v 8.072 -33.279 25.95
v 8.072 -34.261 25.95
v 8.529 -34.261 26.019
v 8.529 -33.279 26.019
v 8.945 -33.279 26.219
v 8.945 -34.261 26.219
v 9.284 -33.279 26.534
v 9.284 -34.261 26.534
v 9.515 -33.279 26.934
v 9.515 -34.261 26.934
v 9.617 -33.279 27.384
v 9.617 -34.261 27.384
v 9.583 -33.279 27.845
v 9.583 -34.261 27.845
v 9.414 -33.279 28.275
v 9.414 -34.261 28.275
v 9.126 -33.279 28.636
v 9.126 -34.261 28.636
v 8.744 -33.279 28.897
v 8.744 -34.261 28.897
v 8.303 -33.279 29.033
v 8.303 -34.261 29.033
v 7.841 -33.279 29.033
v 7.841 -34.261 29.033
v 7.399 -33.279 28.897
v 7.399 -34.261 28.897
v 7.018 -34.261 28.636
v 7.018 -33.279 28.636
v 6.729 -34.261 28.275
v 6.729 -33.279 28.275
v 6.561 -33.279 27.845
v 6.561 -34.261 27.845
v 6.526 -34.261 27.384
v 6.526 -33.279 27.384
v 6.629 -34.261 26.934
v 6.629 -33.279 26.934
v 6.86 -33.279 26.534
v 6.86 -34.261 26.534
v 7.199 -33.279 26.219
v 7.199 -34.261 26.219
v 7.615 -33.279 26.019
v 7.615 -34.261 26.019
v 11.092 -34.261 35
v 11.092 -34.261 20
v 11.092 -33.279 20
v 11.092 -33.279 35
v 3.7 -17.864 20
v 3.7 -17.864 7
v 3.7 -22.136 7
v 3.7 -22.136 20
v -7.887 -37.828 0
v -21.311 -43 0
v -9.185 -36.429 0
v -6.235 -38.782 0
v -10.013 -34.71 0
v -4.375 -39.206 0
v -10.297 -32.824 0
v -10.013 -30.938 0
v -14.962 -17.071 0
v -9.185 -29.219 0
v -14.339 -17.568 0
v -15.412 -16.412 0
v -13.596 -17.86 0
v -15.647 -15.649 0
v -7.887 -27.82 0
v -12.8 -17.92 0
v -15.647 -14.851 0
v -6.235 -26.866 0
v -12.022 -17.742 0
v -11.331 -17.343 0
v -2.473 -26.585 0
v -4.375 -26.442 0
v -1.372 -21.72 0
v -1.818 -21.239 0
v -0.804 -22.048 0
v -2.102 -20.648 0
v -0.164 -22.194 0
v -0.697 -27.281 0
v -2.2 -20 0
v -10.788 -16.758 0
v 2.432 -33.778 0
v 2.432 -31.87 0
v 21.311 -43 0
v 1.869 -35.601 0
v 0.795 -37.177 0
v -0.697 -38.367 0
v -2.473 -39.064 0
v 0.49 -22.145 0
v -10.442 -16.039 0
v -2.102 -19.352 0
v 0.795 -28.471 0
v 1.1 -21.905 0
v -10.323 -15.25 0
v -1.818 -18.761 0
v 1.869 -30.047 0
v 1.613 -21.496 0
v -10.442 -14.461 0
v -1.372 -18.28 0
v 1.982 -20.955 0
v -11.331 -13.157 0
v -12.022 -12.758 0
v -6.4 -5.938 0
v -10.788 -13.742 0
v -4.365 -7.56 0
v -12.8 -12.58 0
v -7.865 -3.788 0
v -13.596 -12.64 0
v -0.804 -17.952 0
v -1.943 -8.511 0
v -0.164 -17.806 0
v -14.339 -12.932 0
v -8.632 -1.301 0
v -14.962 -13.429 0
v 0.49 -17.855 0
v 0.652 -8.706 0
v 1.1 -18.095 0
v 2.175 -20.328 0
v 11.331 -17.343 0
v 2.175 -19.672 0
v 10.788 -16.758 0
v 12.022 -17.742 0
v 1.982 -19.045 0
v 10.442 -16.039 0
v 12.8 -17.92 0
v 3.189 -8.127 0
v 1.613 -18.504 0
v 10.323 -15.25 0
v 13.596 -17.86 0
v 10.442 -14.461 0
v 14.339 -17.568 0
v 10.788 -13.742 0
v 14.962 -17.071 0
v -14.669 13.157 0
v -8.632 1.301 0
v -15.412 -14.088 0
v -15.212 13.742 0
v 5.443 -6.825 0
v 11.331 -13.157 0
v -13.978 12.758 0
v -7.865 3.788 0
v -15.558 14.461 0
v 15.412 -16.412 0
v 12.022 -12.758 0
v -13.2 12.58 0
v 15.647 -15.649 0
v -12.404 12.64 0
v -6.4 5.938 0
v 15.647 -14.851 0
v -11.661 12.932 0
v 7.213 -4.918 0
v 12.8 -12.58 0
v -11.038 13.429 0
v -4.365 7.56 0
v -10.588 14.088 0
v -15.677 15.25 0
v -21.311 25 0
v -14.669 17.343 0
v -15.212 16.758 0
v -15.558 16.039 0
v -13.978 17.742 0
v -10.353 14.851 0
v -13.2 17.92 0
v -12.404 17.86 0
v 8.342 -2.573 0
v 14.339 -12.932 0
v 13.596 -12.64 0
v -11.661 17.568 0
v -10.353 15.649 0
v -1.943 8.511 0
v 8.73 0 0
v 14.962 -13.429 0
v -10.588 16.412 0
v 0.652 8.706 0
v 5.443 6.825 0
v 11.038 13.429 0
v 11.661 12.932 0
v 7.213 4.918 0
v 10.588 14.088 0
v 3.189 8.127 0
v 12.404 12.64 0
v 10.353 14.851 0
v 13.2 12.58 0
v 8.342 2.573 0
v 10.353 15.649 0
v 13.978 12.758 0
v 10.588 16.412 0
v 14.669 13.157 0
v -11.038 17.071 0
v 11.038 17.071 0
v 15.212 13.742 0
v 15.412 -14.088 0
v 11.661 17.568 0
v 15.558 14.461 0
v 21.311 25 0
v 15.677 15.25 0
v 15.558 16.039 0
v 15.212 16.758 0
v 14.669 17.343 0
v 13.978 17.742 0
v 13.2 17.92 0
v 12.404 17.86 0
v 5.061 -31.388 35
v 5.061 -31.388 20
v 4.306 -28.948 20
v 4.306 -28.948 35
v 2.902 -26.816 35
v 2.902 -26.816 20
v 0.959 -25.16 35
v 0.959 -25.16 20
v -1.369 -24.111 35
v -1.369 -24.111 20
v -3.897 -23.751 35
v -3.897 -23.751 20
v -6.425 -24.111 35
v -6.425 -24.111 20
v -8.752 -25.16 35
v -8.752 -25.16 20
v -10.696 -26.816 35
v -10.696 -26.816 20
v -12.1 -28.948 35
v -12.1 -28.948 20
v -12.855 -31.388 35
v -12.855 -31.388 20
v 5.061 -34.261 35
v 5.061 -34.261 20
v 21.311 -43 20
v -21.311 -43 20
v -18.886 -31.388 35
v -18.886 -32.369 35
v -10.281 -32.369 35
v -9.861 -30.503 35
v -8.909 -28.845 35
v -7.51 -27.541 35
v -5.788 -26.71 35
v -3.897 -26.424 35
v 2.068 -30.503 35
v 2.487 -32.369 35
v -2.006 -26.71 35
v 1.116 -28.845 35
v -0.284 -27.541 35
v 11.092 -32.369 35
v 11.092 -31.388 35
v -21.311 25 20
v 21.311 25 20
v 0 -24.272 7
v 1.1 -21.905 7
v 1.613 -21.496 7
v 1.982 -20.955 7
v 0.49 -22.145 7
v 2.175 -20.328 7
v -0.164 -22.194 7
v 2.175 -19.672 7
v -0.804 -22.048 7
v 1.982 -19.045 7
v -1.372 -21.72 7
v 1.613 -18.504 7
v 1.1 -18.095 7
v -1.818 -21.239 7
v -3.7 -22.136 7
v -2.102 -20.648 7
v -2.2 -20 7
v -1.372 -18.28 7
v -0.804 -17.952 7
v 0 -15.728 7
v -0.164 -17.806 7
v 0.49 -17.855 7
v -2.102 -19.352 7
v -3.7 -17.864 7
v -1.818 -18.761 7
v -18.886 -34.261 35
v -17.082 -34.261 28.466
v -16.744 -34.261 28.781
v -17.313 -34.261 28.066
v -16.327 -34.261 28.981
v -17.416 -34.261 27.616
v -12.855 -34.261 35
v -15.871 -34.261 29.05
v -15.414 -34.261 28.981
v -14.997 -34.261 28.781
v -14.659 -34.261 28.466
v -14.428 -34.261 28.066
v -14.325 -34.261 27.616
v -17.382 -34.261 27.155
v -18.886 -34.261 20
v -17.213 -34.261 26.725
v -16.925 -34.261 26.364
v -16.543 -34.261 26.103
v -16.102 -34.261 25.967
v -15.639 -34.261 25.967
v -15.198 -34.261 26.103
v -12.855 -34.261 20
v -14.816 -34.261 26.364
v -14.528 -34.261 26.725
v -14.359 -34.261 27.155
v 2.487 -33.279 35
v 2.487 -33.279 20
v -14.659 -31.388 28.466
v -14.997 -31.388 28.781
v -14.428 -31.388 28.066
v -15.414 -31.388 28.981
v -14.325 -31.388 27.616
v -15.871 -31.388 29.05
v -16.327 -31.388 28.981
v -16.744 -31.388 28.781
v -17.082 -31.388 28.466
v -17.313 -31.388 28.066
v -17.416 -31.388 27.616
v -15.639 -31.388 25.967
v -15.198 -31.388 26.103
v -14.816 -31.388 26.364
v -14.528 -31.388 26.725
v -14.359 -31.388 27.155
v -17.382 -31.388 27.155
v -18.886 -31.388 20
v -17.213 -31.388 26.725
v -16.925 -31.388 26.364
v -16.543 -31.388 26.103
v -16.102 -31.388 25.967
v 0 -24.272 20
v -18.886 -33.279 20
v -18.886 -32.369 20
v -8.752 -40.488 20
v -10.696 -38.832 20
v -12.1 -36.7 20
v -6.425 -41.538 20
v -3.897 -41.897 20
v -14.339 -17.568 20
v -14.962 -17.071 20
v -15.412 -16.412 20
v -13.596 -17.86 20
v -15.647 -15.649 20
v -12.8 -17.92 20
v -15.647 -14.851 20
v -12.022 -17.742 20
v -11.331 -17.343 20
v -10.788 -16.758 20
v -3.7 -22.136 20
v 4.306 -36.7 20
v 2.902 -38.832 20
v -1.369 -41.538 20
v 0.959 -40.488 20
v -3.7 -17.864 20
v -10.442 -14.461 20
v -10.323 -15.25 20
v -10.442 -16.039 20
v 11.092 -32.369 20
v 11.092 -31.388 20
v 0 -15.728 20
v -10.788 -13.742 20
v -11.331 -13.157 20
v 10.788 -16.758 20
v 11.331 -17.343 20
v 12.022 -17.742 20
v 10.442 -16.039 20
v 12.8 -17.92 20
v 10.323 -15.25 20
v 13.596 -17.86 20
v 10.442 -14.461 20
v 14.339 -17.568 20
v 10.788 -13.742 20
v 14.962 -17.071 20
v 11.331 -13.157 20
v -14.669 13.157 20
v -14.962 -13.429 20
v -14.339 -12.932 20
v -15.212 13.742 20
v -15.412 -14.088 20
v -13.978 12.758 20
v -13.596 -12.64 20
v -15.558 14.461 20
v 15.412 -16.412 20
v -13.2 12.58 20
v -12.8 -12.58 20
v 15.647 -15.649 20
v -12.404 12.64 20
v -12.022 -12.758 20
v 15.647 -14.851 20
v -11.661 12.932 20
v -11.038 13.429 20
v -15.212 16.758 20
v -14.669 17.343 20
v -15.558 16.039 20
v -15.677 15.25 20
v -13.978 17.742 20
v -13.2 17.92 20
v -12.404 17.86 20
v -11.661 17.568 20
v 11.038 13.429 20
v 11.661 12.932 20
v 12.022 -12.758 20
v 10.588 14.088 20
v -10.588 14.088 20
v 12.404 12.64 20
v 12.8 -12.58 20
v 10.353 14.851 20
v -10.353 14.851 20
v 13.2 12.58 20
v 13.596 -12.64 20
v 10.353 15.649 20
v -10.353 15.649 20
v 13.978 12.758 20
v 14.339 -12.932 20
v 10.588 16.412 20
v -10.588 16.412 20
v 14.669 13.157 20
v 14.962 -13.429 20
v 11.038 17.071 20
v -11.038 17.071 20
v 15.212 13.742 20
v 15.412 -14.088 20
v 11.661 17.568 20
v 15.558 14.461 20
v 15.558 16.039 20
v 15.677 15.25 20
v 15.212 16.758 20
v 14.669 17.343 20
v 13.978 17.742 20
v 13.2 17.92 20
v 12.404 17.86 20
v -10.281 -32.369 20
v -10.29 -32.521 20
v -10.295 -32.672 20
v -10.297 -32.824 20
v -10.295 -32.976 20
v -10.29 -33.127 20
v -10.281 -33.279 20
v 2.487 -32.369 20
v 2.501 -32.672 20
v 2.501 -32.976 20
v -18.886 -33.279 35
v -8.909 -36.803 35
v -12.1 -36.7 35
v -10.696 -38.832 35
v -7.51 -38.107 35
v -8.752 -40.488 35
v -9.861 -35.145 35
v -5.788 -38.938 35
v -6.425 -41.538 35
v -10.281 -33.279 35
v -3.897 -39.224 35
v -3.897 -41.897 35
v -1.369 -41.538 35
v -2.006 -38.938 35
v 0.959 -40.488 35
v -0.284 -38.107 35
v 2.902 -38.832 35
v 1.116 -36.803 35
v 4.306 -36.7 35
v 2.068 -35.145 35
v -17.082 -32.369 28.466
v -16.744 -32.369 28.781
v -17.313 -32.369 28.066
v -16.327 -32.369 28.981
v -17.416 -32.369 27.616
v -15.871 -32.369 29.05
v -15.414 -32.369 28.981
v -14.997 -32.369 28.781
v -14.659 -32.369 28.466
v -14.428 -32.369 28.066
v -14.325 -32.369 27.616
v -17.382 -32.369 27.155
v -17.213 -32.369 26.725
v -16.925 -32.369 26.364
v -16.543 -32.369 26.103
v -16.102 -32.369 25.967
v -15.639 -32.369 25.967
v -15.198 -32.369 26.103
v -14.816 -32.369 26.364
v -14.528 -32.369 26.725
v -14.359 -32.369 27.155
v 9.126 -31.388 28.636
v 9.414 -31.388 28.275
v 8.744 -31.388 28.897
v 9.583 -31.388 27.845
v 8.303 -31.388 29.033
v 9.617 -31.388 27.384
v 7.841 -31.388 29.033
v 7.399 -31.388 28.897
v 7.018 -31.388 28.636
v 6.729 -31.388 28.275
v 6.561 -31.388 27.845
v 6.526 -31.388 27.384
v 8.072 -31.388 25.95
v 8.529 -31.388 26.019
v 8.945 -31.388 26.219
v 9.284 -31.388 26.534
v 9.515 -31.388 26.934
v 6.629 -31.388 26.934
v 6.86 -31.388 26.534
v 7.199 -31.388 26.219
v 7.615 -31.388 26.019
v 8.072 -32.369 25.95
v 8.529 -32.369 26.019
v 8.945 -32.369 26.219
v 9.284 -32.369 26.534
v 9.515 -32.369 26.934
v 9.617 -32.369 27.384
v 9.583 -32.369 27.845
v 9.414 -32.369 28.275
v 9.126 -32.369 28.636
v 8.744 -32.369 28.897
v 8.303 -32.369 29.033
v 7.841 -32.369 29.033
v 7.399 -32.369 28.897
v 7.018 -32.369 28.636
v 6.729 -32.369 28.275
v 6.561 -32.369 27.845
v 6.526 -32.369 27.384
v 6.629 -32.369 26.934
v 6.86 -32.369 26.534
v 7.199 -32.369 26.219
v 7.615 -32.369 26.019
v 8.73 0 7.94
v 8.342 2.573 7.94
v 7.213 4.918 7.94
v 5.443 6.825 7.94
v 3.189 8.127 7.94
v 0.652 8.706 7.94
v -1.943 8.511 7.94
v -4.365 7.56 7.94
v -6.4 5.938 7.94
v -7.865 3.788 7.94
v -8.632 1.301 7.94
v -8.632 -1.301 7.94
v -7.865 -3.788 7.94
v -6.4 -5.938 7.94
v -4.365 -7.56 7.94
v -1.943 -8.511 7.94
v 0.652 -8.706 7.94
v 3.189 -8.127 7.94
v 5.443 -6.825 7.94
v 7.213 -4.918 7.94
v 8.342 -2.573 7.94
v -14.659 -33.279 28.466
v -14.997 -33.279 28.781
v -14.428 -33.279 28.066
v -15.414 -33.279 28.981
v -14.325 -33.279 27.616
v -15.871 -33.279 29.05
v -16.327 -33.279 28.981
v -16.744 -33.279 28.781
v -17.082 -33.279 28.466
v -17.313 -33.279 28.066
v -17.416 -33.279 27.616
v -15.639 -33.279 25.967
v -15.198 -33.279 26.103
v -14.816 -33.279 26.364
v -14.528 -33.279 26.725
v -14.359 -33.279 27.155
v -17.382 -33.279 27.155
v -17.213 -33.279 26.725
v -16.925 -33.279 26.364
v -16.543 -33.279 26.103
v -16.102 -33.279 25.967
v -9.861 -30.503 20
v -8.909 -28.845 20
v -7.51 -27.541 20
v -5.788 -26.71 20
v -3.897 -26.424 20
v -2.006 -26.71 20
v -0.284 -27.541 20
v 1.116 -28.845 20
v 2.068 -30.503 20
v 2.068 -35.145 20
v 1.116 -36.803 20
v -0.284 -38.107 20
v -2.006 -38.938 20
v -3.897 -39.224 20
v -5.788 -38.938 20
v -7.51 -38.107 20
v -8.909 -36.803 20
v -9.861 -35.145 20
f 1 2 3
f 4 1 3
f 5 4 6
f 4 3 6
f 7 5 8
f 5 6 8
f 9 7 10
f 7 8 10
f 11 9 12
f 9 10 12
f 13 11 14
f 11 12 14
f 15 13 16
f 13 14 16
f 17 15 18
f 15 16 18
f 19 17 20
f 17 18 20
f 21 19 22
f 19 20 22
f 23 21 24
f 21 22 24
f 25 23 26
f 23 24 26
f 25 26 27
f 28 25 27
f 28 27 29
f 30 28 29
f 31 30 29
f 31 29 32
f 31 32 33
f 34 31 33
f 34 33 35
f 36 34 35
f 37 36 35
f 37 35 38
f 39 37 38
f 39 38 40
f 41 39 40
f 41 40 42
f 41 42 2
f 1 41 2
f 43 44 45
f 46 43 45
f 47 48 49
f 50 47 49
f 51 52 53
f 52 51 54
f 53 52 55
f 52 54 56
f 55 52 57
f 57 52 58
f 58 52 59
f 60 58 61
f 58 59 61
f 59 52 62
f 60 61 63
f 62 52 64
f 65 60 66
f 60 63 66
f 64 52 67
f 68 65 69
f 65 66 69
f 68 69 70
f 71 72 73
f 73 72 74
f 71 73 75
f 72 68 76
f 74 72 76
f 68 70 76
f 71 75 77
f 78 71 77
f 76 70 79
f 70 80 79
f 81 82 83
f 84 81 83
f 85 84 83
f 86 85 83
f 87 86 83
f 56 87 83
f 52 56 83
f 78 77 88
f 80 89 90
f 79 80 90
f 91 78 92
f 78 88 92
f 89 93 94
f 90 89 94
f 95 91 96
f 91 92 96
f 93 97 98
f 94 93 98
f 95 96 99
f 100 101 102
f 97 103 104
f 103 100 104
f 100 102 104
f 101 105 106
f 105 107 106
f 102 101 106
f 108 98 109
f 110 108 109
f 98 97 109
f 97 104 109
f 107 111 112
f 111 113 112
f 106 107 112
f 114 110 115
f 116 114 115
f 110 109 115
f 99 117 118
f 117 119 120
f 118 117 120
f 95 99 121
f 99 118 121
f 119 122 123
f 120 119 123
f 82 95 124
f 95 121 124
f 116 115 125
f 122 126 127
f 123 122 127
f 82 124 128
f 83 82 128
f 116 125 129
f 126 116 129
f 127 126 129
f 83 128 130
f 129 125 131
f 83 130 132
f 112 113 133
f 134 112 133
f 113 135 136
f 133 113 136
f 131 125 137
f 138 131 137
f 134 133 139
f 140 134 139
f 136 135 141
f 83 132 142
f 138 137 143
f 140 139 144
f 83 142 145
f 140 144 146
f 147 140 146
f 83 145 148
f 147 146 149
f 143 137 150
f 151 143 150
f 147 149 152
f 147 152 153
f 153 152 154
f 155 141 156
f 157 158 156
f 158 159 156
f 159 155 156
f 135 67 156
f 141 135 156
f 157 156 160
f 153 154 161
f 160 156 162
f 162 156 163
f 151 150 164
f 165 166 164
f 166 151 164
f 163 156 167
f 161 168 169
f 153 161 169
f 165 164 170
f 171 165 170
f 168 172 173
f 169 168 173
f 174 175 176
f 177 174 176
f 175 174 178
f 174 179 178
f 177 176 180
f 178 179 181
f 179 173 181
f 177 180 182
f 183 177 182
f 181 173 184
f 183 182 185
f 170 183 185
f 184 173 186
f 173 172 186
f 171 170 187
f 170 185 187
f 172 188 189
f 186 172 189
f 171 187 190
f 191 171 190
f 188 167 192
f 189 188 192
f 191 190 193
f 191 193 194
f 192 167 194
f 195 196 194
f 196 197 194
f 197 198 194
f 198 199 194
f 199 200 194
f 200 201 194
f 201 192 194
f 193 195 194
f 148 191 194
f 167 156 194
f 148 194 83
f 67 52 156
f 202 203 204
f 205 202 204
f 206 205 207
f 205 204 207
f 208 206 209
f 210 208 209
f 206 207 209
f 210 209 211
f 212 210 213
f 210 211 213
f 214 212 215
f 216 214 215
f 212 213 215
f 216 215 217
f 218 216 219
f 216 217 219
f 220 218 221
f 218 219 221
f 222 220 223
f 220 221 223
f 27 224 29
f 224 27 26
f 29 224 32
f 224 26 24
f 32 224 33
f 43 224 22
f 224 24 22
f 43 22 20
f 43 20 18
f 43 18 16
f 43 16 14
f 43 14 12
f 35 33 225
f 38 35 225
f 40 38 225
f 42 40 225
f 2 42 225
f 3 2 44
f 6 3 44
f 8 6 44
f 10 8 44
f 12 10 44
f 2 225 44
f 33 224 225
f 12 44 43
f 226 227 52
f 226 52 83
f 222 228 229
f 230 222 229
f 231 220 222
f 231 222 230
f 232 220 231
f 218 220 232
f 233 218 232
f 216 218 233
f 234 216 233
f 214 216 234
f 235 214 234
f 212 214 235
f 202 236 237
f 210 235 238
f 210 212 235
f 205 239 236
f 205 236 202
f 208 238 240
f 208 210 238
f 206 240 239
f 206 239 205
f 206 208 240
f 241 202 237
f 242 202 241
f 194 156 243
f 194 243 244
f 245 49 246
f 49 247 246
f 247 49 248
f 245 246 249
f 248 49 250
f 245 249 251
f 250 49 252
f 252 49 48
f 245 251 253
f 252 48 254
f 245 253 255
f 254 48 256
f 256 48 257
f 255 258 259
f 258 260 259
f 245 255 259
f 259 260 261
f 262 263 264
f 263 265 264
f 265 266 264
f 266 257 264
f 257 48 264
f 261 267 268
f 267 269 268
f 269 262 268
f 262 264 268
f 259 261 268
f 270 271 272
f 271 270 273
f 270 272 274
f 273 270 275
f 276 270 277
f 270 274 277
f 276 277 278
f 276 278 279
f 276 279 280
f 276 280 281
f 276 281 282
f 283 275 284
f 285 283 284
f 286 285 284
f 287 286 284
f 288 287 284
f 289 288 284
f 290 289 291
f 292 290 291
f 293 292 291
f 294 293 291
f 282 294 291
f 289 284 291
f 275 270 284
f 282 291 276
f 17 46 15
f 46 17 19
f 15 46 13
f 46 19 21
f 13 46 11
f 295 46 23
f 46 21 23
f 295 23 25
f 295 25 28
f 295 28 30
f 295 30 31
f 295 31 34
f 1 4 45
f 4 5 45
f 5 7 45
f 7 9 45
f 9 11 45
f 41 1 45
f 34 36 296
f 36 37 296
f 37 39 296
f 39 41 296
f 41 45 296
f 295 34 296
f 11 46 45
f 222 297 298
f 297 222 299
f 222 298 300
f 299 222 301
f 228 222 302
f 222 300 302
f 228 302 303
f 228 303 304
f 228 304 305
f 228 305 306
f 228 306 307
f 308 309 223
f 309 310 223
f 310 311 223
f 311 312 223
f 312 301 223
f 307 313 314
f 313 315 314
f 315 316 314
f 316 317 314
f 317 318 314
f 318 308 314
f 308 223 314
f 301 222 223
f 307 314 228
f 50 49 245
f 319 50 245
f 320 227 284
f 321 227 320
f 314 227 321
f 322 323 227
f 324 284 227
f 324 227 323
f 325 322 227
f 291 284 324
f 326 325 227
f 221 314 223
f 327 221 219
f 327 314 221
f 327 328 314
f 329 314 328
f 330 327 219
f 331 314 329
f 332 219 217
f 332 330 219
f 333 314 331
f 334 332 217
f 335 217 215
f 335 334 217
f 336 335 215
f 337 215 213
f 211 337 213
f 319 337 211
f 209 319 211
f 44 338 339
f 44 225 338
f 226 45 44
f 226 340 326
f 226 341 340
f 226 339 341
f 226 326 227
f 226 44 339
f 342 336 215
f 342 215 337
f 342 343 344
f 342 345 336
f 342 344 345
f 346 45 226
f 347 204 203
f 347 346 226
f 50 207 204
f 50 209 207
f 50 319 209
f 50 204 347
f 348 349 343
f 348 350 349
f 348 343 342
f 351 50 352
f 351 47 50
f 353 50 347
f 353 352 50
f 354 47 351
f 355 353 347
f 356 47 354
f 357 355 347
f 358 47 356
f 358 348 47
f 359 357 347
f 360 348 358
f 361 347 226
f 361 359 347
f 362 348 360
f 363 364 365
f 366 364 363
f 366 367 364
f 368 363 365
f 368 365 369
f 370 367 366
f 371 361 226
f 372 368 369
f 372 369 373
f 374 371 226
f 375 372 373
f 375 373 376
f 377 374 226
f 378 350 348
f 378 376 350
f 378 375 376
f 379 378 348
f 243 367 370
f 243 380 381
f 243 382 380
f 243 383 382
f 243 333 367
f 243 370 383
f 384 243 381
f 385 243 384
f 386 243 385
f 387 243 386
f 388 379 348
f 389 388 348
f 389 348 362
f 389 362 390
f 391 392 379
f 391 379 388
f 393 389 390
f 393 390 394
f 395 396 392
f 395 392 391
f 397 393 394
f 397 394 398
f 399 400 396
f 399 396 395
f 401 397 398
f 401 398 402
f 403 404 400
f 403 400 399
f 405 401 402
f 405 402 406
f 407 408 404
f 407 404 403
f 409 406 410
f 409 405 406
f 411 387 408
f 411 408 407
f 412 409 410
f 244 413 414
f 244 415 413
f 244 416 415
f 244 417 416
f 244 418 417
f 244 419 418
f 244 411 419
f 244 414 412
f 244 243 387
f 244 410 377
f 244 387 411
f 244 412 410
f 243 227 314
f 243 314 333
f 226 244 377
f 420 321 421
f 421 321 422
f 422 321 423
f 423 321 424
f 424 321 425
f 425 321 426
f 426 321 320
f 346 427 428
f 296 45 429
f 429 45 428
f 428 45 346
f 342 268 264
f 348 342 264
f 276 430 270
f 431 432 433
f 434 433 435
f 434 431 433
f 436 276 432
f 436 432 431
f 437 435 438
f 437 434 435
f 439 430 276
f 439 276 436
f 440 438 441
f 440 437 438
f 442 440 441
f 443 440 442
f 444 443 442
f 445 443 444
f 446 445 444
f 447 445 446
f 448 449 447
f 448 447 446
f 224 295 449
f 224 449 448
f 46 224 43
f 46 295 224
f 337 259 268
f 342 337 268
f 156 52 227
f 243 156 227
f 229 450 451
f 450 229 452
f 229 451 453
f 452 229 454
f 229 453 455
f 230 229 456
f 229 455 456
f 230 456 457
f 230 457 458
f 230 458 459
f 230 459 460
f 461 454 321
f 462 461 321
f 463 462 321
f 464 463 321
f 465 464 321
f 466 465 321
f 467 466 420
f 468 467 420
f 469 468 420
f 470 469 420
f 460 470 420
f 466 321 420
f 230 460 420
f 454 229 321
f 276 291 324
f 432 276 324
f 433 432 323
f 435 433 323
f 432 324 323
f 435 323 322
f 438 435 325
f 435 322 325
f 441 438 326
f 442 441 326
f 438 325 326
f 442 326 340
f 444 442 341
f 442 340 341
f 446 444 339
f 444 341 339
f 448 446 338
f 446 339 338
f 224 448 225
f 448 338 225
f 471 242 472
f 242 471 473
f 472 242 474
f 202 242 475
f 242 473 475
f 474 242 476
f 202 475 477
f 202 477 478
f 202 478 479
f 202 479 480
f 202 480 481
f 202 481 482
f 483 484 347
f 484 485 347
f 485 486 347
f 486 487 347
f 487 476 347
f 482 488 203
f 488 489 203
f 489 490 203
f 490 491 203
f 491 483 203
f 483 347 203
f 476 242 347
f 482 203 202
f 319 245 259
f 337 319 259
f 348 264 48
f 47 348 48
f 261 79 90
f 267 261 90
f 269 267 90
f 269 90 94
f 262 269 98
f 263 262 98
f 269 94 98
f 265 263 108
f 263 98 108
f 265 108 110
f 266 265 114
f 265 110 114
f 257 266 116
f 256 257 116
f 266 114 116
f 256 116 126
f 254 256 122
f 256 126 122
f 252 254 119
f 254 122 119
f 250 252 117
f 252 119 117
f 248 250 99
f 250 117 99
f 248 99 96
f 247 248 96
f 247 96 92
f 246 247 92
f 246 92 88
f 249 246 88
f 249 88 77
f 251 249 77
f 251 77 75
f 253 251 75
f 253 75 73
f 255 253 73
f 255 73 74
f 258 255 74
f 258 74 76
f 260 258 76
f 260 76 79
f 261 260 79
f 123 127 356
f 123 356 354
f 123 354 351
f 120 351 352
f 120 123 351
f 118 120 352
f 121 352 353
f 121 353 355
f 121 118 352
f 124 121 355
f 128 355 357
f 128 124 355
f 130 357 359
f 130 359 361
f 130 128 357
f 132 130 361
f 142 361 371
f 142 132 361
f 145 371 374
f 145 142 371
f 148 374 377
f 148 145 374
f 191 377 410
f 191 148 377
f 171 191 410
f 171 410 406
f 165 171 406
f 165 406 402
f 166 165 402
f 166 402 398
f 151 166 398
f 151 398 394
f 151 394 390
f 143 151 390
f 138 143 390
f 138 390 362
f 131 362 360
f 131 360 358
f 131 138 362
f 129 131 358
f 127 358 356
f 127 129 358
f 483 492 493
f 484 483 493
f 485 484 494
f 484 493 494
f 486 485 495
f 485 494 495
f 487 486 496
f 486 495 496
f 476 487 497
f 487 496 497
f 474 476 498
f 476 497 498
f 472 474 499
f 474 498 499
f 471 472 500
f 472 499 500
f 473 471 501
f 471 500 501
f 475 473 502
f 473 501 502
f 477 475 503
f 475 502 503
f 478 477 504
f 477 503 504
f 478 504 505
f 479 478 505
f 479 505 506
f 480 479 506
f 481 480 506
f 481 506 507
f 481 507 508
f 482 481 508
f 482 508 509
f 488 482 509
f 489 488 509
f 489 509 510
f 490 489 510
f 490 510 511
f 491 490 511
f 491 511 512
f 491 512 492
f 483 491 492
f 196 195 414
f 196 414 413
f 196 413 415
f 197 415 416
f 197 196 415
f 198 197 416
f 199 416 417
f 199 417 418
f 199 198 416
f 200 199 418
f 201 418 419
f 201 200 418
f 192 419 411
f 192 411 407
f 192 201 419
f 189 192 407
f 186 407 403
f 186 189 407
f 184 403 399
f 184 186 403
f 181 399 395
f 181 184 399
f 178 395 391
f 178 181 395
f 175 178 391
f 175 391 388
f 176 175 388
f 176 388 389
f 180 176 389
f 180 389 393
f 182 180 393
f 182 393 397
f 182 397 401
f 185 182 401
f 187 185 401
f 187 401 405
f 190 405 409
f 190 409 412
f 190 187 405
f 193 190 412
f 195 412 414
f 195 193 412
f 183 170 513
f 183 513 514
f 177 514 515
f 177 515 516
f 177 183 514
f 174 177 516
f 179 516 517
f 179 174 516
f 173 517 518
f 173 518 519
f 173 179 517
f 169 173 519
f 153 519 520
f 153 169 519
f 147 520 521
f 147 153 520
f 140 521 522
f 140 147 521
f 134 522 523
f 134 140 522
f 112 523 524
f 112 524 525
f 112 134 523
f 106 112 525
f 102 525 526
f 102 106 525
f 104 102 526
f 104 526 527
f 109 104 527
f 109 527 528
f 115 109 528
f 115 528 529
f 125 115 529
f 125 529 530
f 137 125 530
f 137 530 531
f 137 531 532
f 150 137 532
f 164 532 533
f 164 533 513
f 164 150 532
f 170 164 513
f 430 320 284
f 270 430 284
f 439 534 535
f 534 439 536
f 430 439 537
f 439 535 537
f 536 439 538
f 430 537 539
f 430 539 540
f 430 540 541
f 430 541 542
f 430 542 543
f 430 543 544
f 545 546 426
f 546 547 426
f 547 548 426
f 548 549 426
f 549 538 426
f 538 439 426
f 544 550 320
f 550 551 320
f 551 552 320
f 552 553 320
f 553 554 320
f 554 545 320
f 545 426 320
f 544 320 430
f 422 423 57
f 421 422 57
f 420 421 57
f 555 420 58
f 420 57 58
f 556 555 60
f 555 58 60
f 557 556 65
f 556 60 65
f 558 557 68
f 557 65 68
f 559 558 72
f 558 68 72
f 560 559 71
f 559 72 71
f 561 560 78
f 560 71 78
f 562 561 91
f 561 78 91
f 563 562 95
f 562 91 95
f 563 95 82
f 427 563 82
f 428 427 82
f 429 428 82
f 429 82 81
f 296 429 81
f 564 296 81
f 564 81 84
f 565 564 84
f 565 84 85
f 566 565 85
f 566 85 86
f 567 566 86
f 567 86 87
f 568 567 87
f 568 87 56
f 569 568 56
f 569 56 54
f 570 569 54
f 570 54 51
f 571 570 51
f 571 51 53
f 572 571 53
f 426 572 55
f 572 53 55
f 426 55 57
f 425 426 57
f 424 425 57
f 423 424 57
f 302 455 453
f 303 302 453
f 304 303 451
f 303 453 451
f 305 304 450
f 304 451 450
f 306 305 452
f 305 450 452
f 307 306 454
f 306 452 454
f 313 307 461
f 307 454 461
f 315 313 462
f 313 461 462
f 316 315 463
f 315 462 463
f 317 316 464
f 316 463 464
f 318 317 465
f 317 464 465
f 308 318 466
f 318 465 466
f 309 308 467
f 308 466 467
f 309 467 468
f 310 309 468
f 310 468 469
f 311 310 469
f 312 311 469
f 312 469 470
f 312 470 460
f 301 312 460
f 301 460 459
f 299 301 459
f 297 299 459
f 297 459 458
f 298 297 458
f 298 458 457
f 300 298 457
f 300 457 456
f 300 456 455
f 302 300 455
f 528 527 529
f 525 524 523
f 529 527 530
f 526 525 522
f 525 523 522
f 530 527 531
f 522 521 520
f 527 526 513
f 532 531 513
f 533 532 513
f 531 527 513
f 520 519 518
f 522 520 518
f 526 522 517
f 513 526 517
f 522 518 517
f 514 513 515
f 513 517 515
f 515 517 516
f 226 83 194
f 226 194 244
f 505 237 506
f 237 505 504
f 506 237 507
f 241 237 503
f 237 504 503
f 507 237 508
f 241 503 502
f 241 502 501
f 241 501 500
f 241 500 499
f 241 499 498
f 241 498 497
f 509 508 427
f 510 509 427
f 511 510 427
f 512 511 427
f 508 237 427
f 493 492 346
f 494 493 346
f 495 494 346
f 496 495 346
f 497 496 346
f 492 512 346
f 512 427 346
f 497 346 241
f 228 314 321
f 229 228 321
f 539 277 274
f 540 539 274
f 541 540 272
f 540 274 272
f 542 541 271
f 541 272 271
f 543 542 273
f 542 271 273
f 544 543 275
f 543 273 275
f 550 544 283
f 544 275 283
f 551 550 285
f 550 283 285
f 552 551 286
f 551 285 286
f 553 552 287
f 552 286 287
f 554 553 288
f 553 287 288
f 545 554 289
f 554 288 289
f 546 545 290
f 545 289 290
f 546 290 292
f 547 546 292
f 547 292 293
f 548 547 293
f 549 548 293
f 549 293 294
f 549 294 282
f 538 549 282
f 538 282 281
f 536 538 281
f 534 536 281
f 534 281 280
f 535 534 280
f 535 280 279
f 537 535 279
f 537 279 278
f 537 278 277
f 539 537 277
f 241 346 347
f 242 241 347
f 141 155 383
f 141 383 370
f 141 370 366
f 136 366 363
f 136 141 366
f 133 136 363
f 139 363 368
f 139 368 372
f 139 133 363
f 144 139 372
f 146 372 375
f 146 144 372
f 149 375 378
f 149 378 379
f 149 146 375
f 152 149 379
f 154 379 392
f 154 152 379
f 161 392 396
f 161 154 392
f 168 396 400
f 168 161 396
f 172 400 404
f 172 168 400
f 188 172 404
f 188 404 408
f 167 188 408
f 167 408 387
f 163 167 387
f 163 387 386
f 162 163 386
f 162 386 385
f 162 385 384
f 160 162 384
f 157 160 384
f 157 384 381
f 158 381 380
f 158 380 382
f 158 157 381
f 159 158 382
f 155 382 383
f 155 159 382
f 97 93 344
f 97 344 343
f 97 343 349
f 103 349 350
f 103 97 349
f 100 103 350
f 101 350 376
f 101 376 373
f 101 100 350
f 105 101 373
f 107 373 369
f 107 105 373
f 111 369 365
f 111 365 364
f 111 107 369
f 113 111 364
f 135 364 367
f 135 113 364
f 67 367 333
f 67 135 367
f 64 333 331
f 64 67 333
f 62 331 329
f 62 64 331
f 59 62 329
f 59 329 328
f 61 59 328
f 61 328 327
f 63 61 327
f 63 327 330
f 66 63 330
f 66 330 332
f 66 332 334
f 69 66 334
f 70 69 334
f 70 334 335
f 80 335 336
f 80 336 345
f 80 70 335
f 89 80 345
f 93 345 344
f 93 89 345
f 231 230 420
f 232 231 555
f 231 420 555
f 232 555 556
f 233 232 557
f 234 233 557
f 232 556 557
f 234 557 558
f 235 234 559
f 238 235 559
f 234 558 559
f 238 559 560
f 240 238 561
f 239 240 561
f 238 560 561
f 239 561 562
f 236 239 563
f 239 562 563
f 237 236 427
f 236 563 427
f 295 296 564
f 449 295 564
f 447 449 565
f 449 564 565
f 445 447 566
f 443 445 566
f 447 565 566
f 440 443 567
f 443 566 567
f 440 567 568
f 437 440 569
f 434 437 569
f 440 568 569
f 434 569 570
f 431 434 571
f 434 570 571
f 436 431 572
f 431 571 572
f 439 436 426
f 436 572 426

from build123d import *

# Parameters (mm, degrees)
SKETCH1_W           = 42.62295082
SKETCH1_H           = 50
SKETCH1_R           = 2.677018134
BOSS_EXTRUDE1_DEPTH = 20
SKETCH2_R           = 8.73
CUT_EXTRUDE2_DEPTH  = 7.94
SKETCH3_R           = 2.2
CUT_EXTRUDE3_DEPTH  = 10
CUT_EXTRUDE4_START  = -7
CUT_EXTRUDE4_DEPTH  = 32.460095998
SKETCH7_W           = 42.62295082
SKETCH7_H           = 20
BOSS_EXTRUDE2_DEPTH = 18
SKETCH6_R           = 6.4
CUT_EXTRUDE5_DEPTH  = 52.992105017
BOSS_EXTRUDE5_DEPTH = 15
SKETCH10_R          = 1.55
CUT_EXTRUDE8_DEPTH  = 80.392562524


with BuildPart() as part:
    # Sketch1 → Boss-Extrude1 (new body)
    with BuildSketch(Plane.XY):
        Rectangle(SKETCH1_W, SKETCH1_H)
        with Locations((-13, -15.25)):
            Circle(SKETCH1_R, mode=Mode.SUBTRACT)
        with Locations(Location((13, -15.25, 0), (0, 0, 180))):
            Circle(SKETCH1_R, mode=Mode.SUBTRACT)
        with Locations((13, 15.25)):
            Circle(SKETCH1_R, mode=Mode.SUBTRACT)
        with Locations(Location((-13, 15.25, 0), (0, 0, 180))):
            Circle(SKETCH1_R, mode=Mode.SUBTRACT)
    extrude(amount=BOSS_EXTRUDE1_DEPTH)

    # Sketch2 → Cut-Extrude2 (cut)
    with BuildSketch(Plane.XY):
        Circle(SKETCH2_R)
    extrude(amount=CUT_EXTRUDE2_DEPTH, mode=Mode.SUBTRACT)

    # Sketch3 → Cut-Extrude3 (cut)
    with BuildSketch(Plane(origin=(0, 0, 0), x_dir=(-1, 0, 0), z_dir=(0, 0, -1))):
        with Locations((0, -20)):
            Circle(SKETCH3_R)
    extrude(amount=-CUT_EXTRUDE3_DEPTH, mode=Mode.SUBTRACT)

    # Sketch5 → Cut-Extrude4 (cut, through all)
    with BuildSketch(Plane(origin=(0, 0, 0), x_dir=(-1, 0, 0), z_dir=(0, 0, -1)).offset(CUT_EXTRUDE4_START)):
        Polygon((0, -15.727608008), (-3.7, -17.863804004), (-3.7, -22.136195996), (0, -24.272391992), (3.7, -22.136195996), (3.7, -17.863804004), align=None)
    extrude(amount=-CUT_EXTRUDE4_DEPTH, mode=Mode.SUBTRACT)

    # Sketch7 → Boss-Extrude2 (add)
    with BuildSketch(Plane.XZ.offset(25)):
        with Locations((0, 10)):
            Rectangle(SKETCH7_W, SKETCH7_H)
    extrude(amount=BOSS_EXTRUDE2_DEPTH)

    # Sketch6 → Cut-Extrude5 (cut, through all)
    with BuildSketch(Plane(origin=(0, 0, 0), x_dir=(-1, 0, 0), z_dir=(0, 0, -1))):
        with Locations((3.896856088, -32.824049036)):
            Circle(SKETCH6_R)
    extrude(amount=-CUT_EXTRUDE5_DEPTH, mode=Mode.SUBTRACT)

    # Sketch8 → Boss-Extrude5 (add)
    with BuildSketch(Plane.XY.offset(20)):
        with BuildLine():
            ThreePointArc((-10.280677785, -32.369273769), (-3.896856088, -26.424049036), (2.486965609, -32.369273769))
            Line((2.486965609, -32.369273769), (11.091790538, -32.369273769))
            Line((11.091790538, -32.369273769), (11.091790538, -31.387593744))
            Line((11.091790538, -31.387593744), (5.061469986, -31.387593744))
            ThreePointArc((5.061469986, -31.387593744), (-3.896856088, -23.751287061), (-12.855182162, -31.387593744))
            Line((-12.855182162, -31.387593744), (-18.885502714, -31.387593744))
            Line((-18.885502714, -31.387593744), (-18.885502714, -32.369273769))
            Line((-18.885502714, -32.369273769), (-10.280677785, -32.369273769))
        make_face()
        with BuildLine():
            Line((-10.280677785, -33.278824303), (-18.885502714, -33.278824303))
            Line((-18.885502714, -33.278824303), (-18.885502714, -34.260504328))
            Line((-18.885502714, -34.260504328), (-12.855182162, -34.260504328))
            ThreePointArc((-12.855182162, -34.260504328), (-3.896856088, -41.896811011), (5.061469986, -34.260504328))
            Line((5.061469986, -34.260504328), (11.091790538, -34.260504328))
            Line((11.091790538, -34.260504328), (11.091790538, -33.278824303))
            Line((11.091790538, -33.278824303), (2.486965609, -33.278824303))
            ThreePointArc((2.486965609, -33.278824303), (-3.896856088, -39.224049036), (-10.280677785, -33.278824303))
        make_face()
    extrude(amount=BOSS_EXTRUDE5_DEPTH)

    # Sketch10 → Cut-Extrude8 (cut, through all)
    with BuildSketch(Plane.XZ.offset(43)):
        with Locations(Location((-15.870502714, 27.5, 0), (0, 0, 90))):
            Circle(SKETCH10_R)
        with Locations(Location((8.071790538, 27.5, 0), (0, 0, 270))):
            Circle(SKETCH10_R)
    extrude(amount=-CUT_EXTRUDE8_DEPTH, mode=Mode.SUBTRACT)


solid = part.part
